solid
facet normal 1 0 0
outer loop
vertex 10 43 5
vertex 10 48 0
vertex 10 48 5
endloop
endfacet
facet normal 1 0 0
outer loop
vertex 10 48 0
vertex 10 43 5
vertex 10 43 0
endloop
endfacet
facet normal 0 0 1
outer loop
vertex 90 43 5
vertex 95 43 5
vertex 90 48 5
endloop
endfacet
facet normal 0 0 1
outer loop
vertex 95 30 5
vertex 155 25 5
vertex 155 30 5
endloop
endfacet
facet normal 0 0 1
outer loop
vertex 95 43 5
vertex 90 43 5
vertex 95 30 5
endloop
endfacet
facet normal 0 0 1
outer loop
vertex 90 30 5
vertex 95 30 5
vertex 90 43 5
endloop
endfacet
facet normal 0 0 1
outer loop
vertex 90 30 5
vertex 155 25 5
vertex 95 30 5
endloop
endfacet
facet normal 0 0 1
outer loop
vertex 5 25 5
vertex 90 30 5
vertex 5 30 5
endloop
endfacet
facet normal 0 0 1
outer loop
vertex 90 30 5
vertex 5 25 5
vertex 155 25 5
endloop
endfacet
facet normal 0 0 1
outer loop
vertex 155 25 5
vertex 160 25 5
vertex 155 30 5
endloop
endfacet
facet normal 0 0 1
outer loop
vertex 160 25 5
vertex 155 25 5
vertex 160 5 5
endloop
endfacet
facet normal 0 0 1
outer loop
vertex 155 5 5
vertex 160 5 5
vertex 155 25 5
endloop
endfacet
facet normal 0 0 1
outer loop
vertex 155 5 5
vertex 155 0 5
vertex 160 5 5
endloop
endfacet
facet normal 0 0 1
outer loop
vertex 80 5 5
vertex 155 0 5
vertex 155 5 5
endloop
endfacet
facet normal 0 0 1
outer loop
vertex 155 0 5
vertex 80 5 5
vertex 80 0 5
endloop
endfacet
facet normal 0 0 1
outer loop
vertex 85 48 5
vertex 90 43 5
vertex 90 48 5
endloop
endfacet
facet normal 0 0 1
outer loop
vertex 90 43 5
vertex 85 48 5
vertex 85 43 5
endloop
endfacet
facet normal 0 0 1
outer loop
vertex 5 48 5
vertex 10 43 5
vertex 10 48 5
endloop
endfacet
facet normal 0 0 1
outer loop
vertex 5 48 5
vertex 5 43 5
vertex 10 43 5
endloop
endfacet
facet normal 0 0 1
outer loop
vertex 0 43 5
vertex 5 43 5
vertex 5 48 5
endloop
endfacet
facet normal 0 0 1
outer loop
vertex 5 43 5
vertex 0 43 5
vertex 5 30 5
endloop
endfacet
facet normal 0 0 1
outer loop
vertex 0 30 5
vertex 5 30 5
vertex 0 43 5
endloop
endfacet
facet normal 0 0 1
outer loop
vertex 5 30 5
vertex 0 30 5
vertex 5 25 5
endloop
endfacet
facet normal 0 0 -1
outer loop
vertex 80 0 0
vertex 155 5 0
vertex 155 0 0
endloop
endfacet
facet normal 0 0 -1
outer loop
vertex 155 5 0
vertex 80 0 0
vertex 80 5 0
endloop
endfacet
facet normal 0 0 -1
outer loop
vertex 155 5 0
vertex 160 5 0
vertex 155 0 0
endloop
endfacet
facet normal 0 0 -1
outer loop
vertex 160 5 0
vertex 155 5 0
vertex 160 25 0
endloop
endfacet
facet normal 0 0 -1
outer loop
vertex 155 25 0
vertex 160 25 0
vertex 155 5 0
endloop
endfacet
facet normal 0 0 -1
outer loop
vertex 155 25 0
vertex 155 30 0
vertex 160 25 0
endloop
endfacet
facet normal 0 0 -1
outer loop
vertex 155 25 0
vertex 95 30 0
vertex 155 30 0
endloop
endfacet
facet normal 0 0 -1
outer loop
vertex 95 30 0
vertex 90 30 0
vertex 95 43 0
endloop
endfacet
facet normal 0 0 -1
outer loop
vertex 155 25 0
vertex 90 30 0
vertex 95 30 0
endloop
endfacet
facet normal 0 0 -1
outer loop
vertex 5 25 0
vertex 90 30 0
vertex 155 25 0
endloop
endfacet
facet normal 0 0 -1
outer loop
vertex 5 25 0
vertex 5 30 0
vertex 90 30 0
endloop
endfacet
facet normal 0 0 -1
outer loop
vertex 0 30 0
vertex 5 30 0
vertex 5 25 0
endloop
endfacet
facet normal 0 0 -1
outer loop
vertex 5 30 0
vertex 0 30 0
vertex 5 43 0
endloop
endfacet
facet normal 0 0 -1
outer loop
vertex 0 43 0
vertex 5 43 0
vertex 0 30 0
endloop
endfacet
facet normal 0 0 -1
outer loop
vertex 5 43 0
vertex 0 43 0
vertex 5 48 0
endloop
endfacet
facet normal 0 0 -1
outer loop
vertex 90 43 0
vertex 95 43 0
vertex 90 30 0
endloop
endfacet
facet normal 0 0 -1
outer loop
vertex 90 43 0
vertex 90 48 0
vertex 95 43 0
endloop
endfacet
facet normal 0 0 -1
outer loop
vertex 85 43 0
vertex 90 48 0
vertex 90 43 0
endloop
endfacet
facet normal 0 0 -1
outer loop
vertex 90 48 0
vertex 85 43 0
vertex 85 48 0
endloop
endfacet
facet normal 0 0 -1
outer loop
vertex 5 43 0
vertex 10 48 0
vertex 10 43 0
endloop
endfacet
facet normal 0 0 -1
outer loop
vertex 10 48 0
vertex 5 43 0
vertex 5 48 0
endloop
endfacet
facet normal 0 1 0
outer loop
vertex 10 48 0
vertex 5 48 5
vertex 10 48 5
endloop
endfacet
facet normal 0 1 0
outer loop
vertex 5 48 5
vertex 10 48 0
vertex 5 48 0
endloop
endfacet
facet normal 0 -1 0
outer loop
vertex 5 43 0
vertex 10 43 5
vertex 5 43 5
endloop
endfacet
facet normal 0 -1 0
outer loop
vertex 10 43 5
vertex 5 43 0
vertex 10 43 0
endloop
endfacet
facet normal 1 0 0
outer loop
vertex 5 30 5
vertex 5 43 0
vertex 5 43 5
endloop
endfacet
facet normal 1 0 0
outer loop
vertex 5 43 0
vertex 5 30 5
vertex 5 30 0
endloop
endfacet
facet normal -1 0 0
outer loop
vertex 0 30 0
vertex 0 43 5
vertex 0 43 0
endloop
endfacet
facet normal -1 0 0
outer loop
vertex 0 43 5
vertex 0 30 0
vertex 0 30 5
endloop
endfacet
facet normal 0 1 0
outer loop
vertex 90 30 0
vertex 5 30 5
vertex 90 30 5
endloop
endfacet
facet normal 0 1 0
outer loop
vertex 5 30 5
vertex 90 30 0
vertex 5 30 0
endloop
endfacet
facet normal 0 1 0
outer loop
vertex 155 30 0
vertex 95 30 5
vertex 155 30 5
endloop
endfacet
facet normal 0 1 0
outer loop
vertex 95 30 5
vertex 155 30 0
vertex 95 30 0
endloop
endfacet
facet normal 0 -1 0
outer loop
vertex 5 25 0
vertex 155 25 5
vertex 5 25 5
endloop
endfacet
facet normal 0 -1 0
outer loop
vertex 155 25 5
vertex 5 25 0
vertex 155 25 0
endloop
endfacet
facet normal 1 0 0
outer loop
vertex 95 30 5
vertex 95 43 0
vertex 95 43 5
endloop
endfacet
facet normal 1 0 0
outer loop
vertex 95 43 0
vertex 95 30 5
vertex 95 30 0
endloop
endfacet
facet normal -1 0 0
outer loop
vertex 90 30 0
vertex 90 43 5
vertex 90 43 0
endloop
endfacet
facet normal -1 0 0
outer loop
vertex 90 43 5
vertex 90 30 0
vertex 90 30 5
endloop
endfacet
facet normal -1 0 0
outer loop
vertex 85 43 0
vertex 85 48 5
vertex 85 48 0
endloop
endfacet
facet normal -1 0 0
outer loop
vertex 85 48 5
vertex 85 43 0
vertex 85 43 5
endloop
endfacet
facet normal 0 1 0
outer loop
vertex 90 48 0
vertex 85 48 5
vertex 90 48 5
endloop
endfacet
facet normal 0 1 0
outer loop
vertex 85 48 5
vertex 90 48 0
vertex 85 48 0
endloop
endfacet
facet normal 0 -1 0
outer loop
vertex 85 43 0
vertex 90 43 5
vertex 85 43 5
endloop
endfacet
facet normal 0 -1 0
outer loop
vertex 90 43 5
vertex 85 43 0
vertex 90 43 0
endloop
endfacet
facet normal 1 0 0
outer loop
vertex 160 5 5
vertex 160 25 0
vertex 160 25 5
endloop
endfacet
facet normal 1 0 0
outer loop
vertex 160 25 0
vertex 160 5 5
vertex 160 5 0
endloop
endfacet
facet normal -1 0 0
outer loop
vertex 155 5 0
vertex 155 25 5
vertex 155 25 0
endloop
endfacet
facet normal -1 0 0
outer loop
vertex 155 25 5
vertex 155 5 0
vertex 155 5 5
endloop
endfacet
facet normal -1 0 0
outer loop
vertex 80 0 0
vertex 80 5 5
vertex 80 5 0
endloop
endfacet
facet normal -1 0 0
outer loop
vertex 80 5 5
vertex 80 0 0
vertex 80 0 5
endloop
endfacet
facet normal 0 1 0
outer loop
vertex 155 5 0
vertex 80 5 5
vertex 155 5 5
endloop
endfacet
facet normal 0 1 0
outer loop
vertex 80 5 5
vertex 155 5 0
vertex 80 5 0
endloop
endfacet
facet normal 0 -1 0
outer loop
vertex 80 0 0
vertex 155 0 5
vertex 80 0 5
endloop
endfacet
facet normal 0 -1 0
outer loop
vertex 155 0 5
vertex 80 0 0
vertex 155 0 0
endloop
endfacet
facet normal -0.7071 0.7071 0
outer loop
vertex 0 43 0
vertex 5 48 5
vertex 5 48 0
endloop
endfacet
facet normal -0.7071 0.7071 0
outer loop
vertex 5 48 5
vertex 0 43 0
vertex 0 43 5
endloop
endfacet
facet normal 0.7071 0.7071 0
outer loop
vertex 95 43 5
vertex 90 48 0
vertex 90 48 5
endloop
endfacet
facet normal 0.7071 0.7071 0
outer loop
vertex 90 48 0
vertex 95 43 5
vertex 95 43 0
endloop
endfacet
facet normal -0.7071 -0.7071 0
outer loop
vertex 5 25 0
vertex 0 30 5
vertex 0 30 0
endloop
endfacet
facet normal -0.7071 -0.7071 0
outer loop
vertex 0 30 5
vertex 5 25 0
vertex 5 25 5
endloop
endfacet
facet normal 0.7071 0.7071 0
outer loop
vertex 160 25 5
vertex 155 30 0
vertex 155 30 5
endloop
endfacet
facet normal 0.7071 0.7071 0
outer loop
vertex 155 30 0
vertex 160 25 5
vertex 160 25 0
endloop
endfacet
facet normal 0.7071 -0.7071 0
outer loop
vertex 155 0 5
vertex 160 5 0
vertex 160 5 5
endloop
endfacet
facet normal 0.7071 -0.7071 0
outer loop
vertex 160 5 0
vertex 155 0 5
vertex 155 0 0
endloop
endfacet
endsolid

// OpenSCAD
// [FL_INDEX: keywords="openscad, 3d_parametric, Universal_Sun_Visor_Device_Mount, csg_solid" | COT="Parametric OpenSCAD design from 3DCodeverse"]
// Title: Universal Sun Visor Device Mount

// Device Width
device_width = 85; // [1:200]
// Device Thickness
device_thickness = 13; // [1:50]
// Visor Thickness
visor_thickness = 20; // [1:50]
// Visor Height
visor_height = 150; // [1:300]
// Thickness
thickness = 5; // [1:10]

// device holder
translate([thickness, thickness+device_thickness+visor_thickness+thickness, 0])
	cube([thickness, thickness, thickness]);
translate([0, thickness+visor_thickness+thickness, 0])
	cube([thickness, device_thickness, thickness]);
translate([thickness, visor_thickness+thickness, 0])
	cube([device_width, thickness, thickness]);
translate([thickness+device_width, thickness+visor_thickness+thickness, 0])
	cube([thickness, device_thickness, thickness]);
translate([device_width, thickness+device_thickness+visor_thickness+thickness, 0])
	cube([thickness, thickness, thickness]);

// visor clip
translate([thickness, visor_thickness+thickness, 0])
	cube([visor_height, thickness, thickness]);
translate([thickness+visor_height, thickness, 0])
	cube([thickness, visor_thickness, thickness]);
translate([thickness+(visor_height/2), 0, 0])
	cube([visor_height/2, thickness, thickness]);

linear_extrude(thickness) {	
	polygon(points=[
		[0,         thickness+visor_thickness+thickness], 
		[thickness, thickness+visor_thickness+thickness], 
		[thickness, thickness+visor_thickness]], paths=[[0, 1, 2]]);
	polygon(points=[
		[0,         thickness+visor_thickness+thickness+device_thickness], 
		[thickness, thickness+visor_thickness+thickness+device_thickness+thickness], 
		[thickness, thickness+visor_thickness+thickness+device_thickness]], paths=[[0, 1, 2]]);
	polygon(points=[
		[thickness+visor_height,           0], 
		[thickness+visor_height,           thickness], 
		[thickness+visor_height+thickness, thickness]], paths=[[0, 1, 2]]);
	polygon(points=[
		[thickness+visor_height,           thickness+visor_thickness], 
		[thickness+visor_height,           thickness+visor_thickness+thickness], 
		[thickness+visor_height+thickness, thickness+visor_thickness]], paths=[[0, 1, 2]]);
	polygon(points=[
		[thickness+device_width,           thickness+visor_thickness], 
		[thickness+device_width,           thickness+visor_thickness+thickness], 
		[thickness+device_width+thickness, thickness+visor_thickness+thickness]], paths=[[0, 1, 2]]);
	polygon(points=[
		[thickness+device_width,           thickness+visor_thickness+thickness+device_thickness], 
		[thickness+device_width,           thickness+visor_thickness+thickness+device_thickness+thickness], 
		[thickness+device_width+thickness, thickness+visor_thickness+thickness+device_thickness]], paths=[[0, 1, 2]]);
}
